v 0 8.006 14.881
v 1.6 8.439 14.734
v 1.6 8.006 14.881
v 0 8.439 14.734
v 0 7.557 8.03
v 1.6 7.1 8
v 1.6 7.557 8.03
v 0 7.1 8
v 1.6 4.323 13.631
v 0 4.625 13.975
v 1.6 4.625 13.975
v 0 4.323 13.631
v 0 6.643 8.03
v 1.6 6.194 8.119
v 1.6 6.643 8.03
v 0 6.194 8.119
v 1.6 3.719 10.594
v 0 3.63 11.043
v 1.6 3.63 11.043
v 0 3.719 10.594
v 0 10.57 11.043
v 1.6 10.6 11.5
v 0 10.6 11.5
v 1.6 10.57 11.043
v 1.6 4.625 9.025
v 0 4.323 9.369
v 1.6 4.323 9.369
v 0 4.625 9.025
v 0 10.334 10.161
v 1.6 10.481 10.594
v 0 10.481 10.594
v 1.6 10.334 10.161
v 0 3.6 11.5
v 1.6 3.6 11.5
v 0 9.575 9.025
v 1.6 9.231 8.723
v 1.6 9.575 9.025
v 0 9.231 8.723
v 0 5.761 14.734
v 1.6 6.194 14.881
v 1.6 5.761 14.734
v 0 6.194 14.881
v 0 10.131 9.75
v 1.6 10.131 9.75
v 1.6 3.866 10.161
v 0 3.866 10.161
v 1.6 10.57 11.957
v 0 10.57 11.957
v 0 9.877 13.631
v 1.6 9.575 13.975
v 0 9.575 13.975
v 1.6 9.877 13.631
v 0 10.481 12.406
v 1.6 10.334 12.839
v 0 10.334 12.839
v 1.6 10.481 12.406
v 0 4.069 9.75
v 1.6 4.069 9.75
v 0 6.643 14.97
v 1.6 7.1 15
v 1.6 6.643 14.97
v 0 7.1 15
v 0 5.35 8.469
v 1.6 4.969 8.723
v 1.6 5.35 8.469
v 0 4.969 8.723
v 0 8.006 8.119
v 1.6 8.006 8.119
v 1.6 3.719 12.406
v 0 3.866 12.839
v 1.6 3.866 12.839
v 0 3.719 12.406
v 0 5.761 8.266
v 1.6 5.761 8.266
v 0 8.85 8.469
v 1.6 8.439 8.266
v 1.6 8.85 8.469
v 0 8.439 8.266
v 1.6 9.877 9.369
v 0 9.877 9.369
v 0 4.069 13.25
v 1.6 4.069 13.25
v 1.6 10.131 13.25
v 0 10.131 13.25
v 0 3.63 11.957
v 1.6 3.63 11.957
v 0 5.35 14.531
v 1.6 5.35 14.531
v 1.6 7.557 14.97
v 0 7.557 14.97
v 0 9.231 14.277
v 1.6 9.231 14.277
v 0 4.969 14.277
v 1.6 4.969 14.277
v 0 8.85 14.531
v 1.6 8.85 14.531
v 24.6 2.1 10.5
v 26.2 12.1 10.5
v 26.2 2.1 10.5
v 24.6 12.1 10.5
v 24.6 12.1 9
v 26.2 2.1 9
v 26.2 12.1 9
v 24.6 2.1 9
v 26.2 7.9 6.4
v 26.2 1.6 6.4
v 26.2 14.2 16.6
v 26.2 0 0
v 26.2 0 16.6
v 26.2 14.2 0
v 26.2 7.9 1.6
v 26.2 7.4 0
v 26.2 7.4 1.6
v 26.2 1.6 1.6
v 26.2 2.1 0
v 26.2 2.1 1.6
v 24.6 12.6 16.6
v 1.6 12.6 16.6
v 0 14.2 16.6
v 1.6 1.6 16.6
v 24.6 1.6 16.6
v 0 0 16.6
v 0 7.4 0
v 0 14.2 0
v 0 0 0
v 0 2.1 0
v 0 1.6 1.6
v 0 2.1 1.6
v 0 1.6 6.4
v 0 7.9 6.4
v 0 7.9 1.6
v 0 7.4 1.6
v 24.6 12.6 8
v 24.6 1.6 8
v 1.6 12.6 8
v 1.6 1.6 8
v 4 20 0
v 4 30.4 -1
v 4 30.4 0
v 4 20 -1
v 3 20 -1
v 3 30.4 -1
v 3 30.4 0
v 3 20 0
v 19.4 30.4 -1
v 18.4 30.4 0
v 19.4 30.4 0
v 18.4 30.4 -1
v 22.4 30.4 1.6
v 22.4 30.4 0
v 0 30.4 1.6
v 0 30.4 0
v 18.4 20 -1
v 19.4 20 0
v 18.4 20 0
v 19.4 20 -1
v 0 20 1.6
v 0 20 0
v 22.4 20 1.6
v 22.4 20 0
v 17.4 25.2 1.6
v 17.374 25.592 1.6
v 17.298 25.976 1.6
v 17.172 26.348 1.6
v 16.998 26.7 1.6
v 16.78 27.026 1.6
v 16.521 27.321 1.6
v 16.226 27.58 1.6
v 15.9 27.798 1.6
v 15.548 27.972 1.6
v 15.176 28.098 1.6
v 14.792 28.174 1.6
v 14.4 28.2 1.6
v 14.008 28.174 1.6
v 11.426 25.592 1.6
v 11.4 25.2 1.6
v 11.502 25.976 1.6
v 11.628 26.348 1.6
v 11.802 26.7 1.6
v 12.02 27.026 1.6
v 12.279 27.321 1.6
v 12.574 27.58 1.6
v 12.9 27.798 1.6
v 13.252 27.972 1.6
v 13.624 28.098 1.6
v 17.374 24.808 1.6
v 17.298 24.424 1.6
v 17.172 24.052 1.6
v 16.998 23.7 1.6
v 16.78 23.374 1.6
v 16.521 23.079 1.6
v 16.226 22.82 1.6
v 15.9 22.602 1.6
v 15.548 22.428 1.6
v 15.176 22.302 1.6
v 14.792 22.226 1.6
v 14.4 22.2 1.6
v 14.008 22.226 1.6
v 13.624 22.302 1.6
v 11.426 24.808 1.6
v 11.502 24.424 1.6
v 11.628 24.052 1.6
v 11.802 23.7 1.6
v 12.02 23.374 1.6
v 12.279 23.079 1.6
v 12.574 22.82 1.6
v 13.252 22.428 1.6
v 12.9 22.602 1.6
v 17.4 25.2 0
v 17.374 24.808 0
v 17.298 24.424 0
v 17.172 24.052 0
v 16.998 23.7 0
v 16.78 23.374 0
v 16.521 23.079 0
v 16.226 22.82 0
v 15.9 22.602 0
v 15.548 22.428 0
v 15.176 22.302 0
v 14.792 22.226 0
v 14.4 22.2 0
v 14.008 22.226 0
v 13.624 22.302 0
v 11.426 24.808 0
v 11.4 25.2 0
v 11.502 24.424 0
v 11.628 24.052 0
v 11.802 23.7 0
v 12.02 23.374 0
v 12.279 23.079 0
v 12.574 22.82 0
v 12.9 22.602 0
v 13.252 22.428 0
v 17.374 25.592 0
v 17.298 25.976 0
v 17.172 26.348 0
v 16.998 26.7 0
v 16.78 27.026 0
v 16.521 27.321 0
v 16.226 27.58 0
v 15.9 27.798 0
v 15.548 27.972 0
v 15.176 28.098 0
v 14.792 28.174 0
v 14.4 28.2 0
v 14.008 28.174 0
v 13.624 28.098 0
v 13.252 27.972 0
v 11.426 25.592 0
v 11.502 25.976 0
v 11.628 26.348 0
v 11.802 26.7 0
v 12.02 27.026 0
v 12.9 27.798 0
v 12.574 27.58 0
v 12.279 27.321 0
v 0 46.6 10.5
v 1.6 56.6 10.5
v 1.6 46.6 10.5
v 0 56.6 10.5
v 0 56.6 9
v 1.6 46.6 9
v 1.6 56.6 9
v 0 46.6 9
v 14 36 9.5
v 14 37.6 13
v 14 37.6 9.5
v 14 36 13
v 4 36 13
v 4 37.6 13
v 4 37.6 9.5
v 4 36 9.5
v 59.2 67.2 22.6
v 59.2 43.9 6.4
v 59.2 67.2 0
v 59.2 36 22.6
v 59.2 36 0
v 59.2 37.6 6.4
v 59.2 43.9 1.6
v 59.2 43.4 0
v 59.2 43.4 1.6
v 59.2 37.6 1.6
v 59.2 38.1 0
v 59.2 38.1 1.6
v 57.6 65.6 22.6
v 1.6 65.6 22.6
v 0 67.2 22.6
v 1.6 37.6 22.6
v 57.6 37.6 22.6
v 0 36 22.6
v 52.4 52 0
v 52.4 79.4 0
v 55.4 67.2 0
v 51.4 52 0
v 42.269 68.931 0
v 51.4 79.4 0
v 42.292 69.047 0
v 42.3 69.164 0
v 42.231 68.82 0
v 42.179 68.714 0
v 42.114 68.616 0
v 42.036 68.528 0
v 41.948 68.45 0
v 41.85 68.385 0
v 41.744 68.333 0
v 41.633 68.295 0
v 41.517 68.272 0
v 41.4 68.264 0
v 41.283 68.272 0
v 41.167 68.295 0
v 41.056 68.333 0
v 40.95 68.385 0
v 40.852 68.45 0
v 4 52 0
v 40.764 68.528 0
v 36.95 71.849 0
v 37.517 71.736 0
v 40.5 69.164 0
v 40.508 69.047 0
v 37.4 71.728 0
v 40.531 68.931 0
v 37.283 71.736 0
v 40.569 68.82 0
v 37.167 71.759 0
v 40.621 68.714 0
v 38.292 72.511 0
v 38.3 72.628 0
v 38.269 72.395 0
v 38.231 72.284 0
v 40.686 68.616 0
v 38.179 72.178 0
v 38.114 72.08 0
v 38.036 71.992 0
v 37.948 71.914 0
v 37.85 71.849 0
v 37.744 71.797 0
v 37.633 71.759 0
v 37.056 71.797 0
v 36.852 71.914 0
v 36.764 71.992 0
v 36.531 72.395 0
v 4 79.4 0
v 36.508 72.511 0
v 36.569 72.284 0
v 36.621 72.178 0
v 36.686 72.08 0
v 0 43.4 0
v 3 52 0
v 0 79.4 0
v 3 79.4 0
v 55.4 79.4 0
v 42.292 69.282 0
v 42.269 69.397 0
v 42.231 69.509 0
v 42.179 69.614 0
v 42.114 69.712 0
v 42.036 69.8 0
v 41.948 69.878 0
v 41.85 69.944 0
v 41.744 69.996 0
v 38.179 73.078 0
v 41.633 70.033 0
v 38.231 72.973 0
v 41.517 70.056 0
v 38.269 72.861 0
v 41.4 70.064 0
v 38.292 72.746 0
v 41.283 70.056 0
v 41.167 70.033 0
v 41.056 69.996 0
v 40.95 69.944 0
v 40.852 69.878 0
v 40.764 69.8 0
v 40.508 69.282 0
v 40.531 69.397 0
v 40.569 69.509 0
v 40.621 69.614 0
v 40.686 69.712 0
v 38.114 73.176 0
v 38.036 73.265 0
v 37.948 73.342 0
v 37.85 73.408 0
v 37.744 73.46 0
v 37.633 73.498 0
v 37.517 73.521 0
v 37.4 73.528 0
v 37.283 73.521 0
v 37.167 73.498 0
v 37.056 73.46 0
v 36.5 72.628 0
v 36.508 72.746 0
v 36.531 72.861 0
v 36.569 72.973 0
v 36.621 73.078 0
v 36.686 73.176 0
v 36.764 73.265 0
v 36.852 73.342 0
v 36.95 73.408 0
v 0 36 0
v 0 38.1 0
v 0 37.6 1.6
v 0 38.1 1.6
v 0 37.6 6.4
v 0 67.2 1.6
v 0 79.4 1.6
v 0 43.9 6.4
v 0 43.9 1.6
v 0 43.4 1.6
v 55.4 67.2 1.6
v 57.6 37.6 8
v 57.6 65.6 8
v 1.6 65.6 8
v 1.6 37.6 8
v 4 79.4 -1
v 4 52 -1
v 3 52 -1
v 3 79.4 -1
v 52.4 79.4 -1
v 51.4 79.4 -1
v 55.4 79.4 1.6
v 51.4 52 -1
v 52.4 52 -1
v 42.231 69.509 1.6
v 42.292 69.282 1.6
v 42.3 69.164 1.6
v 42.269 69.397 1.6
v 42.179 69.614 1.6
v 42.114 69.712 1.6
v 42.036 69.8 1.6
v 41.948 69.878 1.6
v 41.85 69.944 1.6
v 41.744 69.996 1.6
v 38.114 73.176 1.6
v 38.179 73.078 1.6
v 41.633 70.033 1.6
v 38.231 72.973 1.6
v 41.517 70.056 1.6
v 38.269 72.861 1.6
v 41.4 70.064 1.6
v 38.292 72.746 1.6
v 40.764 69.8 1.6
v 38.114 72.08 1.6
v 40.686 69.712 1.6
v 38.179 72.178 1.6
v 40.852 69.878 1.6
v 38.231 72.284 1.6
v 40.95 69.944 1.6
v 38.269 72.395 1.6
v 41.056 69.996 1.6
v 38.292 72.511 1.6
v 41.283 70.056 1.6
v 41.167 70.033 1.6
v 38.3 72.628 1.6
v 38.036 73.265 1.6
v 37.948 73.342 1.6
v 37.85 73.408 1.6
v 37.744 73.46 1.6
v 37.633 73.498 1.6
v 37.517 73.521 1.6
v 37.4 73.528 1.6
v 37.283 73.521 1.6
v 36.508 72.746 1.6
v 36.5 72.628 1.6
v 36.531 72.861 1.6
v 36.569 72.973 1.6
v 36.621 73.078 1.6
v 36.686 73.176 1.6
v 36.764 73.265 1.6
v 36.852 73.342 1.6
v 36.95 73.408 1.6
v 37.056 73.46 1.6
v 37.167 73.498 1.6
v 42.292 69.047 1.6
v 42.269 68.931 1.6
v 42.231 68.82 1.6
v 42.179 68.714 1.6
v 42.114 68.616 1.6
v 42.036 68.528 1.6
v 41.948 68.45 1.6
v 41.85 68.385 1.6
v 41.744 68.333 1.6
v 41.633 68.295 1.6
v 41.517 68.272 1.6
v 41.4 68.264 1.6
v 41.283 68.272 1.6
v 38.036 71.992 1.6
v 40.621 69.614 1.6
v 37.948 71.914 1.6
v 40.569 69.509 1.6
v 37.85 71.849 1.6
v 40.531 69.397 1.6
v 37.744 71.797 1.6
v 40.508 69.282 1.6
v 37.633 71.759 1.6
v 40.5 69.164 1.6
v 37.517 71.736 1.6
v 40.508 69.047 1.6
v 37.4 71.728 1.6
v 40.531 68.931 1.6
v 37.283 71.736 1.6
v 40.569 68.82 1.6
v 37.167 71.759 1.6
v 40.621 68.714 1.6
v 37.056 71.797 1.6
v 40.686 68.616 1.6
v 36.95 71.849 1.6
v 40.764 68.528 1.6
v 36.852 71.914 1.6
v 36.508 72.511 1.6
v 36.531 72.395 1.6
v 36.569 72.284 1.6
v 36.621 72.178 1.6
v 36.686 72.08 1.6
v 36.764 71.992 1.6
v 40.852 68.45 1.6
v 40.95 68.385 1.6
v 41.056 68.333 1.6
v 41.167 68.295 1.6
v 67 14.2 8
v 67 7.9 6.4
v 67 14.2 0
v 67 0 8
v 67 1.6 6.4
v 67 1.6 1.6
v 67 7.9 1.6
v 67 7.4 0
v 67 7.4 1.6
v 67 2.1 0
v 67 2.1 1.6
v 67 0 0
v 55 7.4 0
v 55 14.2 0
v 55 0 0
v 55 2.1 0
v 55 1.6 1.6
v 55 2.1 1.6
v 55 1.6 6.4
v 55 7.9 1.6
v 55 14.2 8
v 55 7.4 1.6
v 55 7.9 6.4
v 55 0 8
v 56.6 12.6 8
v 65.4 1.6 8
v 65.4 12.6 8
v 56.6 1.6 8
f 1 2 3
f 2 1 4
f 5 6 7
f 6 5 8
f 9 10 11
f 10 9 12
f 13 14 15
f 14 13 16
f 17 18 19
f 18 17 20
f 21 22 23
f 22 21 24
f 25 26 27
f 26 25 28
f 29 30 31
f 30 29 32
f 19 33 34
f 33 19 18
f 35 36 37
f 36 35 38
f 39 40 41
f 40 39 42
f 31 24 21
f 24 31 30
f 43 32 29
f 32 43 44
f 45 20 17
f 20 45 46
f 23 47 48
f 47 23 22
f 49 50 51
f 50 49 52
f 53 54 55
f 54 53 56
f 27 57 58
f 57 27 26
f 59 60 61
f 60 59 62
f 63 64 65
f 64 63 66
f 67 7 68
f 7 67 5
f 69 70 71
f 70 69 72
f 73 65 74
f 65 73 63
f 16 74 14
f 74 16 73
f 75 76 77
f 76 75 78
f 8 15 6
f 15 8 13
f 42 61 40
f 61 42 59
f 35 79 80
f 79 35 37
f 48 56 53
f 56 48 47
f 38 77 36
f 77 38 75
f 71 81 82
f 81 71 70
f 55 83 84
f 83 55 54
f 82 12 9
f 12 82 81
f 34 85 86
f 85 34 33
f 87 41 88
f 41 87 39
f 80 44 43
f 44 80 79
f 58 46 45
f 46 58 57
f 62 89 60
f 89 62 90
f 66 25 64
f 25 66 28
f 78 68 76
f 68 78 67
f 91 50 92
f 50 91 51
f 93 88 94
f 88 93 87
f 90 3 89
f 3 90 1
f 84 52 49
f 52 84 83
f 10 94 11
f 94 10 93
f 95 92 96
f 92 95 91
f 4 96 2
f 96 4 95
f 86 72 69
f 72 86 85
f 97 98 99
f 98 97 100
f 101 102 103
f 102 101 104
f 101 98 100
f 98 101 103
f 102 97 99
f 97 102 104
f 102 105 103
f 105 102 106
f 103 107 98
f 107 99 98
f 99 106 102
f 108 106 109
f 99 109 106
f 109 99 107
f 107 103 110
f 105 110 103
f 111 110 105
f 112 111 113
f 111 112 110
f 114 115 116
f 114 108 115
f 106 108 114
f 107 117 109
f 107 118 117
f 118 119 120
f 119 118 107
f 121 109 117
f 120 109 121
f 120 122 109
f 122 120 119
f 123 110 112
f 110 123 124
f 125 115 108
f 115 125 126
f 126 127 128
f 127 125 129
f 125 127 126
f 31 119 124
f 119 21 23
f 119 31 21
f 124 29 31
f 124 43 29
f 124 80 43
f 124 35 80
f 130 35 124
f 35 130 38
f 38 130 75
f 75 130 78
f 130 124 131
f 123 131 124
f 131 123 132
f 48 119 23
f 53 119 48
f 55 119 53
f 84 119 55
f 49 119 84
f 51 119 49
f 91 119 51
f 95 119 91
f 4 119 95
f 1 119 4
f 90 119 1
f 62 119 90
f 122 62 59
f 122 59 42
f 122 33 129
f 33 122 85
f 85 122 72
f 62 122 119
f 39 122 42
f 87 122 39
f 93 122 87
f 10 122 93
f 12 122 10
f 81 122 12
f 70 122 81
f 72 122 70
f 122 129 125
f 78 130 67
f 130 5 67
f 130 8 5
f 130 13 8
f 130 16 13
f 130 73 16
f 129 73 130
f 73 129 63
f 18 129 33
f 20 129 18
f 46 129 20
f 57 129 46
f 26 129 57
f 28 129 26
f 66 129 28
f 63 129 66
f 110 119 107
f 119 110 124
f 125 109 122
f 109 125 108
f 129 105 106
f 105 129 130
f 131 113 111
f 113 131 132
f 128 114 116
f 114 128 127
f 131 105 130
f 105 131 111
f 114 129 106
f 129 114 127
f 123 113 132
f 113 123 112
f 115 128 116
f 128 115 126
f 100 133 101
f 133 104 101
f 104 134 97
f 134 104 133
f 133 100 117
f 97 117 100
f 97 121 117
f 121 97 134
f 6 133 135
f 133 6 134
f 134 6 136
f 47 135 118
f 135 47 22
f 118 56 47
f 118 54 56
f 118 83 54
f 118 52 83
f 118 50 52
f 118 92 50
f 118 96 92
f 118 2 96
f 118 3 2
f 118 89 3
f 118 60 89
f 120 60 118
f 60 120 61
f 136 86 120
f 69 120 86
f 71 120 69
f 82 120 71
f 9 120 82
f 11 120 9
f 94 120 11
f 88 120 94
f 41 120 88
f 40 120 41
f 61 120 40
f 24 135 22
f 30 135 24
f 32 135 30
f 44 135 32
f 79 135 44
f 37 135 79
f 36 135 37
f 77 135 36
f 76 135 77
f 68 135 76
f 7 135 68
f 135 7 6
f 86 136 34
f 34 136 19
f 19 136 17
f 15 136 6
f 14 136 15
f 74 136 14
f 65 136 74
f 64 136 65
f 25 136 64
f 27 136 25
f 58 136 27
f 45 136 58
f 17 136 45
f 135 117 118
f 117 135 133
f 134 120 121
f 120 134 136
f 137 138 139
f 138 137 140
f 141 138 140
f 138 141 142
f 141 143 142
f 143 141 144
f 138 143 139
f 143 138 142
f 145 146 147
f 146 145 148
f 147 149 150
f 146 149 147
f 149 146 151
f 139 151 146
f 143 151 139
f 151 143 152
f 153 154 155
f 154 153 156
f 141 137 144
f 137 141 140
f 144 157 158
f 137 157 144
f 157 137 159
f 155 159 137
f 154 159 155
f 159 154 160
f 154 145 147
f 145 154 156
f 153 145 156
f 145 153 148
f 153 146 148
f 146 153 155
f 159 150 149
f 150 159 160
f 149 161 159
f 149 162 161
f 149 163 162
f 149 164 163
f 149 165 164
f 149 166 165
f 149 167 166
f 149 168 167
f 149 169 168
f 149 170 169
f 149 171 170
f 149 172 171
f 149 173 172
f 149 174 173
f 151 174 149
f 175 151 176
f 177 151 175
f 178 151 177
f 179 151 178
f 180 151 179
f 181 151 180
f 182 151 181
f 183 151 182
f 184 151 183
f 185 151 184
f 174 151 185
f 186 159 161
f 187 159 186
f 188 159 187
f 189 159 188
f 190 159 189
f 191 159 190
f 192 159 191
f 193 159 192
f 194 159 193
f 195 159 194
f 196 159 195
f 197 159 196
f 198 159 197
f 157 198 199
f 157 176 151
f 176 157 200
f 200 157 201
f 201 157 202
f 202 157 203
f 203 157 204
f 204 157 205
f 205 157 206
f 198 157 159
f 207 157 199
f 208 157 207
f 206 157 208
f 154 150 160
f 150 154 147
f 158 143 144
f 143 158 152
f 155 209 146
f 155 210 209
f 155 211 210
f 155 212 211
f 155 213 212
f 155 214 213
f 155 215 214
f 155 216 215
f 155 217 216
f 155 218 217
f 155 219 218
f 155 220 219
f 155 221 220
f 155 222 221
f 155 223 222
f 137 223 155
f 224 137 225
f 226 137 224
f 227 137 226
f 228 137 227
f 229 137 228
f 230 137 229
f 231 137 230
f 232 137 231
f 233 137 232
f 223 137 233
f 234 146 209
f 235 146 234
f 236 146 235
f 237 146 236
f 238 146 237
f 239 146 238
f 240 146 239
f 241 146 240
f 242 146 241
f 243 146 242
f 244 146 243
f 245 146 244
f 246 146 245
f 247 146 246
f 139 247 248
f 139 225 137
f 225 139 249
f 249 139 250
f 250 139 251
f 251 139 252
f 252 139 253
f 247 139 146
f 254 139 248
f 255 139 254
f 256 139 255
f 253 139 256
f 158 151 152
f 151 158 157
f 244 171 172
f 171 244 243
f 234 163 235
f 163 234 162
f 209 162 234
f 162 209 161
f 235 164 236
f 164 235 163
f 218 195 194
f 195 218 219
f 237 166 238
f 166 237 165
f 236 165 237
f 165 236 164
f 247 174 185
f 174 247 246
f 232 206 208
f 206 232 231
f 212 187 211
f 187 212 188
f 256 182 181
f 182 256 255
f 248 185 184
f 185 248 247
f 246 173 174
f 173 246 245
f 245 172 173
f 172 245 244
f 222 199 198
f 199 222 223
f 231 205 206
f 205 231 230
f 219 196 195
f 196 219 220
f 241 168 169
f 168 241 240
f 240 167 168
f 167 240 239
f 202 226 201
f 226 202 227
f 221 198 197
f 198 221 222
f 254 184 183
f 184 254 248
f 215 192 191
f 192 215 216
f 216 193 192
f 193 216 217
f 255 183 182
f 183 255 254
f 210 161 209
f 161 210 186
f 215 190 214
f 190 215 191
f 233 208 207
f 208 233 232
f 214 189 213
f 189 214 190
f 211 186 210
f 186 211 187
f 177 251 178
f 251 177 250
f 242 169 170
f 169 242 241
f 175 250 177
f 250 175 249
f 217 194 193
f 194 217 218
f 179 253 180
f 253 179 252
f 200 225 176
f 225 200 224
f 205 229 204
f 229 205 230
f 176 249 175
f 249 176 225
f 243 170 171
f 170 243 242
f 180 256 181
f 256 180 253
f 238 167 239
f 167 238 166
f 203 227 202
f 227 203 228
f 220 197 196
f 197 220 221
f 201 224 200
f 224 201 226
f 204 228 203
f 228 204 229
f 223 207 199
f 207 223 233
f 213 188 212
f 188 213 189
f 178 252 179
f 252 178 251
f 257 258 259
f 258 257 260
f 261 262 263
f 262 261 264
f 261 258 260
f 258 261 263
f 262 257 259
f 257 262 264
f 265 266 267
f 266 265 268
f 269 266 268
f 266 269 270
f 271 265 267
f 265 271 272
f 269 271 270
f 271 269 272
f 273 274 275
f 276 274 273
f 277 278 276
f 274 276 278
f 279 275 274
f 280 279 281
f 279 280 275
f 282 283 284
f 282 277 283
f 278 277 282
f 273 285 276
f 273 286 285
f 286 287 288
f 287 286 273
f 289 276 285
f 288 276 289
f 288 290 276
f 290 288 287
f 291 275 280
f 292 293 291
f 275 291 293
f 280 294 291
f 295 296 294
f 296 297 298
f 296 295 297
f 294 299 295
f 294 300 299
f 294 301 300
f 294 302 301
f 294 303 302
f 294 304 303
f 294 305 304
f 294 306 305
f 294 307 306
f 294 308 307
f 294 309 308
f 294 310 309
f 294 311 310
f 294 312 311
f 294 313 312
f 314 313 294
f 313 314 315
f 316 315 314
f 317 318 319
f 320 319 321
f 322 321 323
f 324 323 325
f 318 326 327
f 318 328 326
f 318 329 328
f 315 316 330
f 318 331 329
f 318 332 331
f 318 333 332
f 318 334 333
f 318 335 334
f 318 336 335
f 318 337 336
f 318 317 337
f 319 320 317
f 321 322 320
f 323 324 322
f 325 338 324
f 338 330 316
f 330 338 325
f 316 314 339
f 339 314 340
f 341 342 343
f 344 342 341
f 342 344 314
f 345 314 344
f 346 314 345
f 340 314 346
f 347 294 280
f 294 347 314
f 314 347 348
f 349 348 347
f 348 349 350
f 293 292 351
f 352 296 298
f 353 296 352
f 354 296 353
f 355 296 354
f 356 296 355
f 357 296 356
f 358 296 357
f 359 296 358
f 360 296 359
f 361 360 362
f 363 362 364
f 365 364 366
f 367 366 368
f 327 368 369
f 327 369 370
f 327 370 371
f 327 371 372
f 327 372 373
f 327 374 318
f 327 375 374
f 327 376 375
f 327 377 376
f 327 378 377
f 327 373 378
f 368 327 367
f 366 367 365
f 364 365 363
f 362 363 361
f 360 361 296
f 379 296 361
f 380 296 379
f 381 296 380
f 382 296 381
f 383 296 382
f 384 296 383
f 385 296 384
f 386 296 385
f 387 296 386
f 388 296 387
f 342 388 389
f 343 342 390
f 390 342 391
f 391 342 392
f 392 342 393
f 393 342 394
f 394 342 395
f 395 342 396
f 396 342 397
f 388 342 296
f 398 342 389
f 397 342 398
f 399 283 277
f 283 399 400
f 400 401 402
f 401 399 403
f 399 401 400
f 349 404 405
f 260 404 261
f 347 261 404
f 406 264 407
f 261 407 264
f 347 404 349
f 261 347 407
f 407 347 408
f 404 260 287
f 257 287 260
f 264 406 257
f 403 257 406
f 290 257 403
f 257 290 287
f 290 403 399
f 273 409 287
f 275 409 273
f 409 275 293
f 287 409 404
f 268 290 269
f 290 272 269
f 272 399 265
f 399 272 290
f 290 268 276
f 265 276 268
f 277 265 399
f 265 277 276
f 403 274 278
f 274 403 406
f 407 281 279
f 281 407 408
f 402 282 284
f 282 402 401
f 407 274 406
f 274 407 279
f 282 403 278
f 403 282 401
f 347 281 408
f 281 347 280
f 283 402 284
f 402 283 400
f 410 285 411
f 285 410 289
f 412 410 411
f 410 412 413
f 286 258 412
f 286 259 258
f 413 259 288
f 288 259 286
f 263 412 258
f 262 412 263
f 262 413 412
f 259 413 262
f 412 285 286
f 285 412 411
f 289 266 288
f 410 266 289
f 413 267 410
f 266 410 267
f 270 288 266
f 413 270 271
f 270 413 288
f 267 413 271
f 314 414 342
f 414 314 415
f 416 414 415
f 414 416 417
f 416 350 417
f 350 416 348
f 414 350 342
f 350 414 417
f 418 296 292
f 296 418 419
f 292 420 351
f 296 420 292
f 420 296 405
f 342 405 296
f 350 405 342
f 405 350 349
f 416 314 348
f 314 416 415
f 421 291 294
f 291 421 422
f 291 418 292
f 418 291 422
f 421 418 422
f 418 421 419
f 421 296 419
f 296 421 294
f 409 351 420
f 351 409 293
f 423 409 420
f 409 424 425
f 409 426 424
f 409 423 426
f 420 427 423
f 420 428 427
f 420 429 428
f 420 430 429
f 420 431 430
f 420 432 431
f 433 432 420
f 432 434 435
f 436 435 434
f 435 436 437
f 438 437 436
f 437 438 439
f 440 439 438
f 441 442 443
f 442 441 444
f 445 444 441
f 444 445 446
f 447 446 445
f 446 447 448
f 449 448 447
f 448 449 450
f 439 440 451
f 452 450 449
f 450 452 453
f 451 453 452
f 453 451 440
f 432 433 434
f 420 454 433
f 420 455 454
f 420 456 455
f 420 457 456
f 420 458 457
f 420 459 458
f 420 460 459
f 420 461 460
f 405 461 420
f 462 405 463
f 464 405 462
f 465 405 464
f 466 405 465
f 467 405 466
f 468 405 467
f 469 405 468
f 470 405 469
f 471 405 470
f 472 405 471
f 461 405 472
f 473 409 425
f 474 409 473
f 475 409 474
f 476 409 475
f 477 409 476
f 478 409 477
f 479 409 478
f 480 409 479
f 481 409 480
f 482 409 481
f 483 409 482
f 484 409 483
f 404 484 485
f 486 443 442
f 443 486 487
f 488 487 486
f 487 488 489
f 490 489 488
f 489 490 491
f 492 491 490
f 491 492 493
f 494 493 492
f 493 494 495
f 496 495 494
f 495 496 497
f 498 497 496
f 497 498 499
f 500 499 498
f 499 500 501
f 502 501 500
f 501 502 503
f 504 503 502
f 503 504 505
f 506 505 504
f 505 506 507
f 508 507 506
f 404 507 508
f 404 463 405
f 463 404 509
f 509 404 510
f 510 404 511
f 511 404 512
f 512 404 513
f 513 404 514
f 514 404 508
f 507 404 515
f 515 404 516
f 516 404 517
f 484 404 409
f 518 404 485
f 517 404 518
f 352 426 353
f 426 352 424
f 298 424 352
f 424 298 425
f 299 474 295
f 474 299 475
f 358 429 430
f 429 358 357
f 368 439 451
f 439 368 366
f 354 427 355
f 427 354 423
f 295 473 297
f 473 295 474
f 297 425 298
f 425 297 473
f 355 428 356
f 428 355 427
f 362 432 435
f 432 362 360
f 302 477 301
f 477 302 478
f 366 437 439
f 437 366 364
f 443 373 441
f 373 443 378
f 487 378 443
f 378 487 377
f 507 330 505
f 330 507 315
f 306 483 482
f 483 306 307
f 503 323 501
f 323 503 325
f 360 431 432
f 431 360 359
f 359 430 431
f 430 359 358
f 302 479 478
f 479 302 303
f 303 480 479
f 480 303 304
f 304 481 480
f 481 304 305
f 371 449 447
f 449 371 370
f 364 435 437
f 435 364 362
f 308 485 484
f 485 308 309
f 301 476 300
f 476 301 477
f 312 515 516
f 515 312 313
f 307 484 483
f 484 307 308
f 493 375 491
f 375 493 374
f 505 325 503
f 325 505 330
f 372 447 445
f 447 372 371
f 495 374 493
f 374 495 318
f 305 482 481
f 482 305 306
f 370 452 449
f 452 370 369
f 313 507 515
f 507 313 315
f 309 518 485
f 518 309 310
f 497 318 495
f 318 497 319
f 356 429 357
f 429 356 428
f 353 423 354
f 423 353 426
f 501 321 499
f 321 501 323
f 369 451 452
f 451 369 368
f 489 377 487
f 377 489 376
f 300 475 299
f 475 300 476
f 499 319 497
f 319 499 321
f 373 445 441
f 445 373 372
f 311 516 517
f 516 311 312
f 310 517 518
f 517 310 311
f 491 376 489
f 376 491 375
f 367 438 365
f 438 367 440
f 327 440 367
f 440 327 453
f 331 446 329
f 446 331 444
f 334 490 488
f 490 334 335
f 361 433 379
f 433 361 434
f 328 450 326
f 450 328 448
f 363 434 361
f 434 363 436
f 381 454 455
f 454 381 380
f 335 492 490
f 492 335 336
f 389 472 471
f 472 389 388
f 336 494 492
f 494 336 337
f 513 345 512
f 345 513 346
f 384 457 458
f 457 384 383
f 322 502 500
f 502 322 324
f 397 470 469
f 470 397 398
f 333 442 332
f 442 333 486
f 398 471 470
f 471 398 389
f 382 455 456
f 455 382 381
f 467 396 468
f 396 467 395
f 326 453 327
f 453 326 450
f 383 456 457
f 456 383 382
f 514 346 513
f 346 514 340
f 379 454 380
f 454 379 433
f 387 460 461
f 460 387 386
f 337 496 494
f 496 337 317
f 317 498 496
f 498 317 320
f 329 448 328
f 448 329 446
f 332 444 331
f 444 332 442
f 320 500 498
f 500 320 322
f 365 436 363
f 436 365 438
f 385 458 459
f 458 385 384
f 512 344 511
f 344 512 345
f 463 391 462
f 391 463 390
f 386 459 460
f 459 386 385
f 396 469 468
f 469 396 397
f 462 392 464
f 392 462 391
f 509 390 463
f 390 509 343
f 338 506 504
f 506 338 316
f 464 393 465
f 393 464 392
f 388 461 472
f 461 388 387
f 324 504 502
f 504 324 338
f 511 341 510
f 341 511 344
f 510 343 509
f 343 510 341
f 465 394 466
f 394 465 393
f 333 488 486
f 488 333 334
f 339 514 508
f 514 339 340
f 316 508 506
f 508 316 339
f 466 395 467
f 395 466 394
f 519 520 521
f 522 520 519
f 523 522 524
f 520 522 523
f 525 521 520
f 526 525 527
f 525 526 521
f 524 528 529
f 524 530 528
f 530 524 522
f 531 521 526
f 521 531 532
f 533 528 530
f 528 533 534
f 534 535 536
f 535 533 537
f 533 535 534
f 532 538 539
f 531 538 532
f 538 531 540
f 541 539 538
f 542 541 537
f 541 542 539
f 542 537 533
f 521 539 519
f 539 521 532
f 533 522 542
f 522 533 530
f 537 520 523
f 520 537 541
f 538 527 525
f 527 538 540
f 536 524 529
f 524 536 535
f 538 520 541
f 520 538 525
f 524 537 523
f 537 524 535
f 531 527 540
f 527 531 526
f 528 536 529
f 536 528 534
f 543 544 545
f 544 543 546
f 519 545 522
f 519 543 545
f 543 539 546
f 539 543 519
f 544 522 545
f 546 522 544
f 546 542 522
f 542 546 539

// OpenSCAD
// Vocalens temple-clip pods — first mechanical prototype
//
// Design approach: rather than fabricate a full glasses frame (hinges, nose
// bridge, lens-fit) from scratch, these pods clip onto the temple arm of an
// existing pair of glasses. Two small pods instead of one big one, split by
// where the weight naturally belongs:
//   - FRONT POD: near the hinge. Houses ONLY the camera module, detached
//     from the XIAO and connected back by its FPC ribbon, plus the touch
//     pad. The camera has to be at the front (it must aim forward) but
//     nothing else does — so nothing else goes here. This is what keeps
//     the visible, forward part of the device small.
//   - REAR POD: behind the ear. Houses the XIAO board, battery and buzzer
//     (placeholder for the eventual bone-conduction transducer). Behind-
//     the-ear is where hearing aids and BTE headphones put their bulk for
//     exactly this reason — it's already physically "spoken for" on a
//     normal face, and hair covers it.
//   - The camera ribbon runs along the temple arm between the two. Route
//     it under the arm or tuck it along the top edge; a dab of removable
//     adhesive at one or two points is enough for a prototype.
//
// The temple channel is cut THROUGH the pod body rather than bolted
// underneath it, so the channel ceiling and the cavity floor share one
// wall. That's worth ~5mm of height versus stacking a separate clip.
//
// Printer: Snapmaker U1, 270x270x270mm, standard FDM. WALL and CLEARANCE
// assume a 0.4mm nozzle — adjust those two first if your profile differs.
//
// !! MEASURE BEFORE PRINTING !!
// TEMPLE_* must match the actual glasses you're clipping onto, and the
// CAM_*/XIAO_* values must match your actual parts. Everything else
// follows from those. Print ONE fit-test piece (part="fit_test") before
// committing to a full pod — it's a 3-minute print that will save you a
// wasted hour.
//
// PLACEHOLDER SIZES: no touch sensor, amp, or battery sourced yet (team
// has the Freenove Ultimate Starter Kit + XIAO Sense only). Battery and
// buzzer cavities are sized for common off-the-shelf parts so this prints
// and test-fits NOW; tighten them once real parts arrive.
//
// Render each printable part:
//   openscad -o front_base.stl -D 'part="front_base"' vocalens_pod.scad
//   openscad -o front_lid.stl  -D 'part="front_lid"'  vocalens_pod.scad
//   openscad -o rear_base.stl  -D 'part="rear_base"'  vocalens_pod.scad
//   openscad -o rear_lid.stl   -D 'part="rear_lid"'   vocalens_pod.scad
//   openscad -o fit_test.stl   -D 'part="fit_test"'   vocalens_pod.scad

/* [Print settings] */
WALL = 1.6;        // 4 perimeters at 0.4mm nozzle — don't go below 1.2
CLEARANCE = 0.3;   // fit tolerance between mating FDM parts
EPS = 0.01;        // overlap to avoid coplanar faces in unions
$fn = 48;

/* [Temple arm — MEASURE YOUR ACTUAL GLASSES] */
TEMPLE_THICKNESS = 4.5;  // temple arm thickness (side to side), mm
TEMPLE_WIDTH = 6.0;      // temple arm width (top to bottom), mm
SNAP_GAP = 1.0;          // how much narrower the opening is than the arm

/* [Camera module — detached from the XIAO, on its FPC ribbon] */
// The OV2640 module on the Sense expansion unclips from its FPC connector
// and can sit on its own. MEASURE YOURS — these are generous placeholders.
CAM_LEN = 11;   // along the temple
CAM_WID = 11;   // across (this is what sets front-pod width)
CAM_HGT = 7;    // protrusion from the temple

/* [XIAO ESP32S3 Sense board] */
// Bare XIAO is ~21 x 17.5mm. XIAO_HGT is the board + Sense expansion stack
// WITHOUT the camera module. In SINGLE_POD mode the camera stays attached,
// so its height is added automatically below.
XIAO_LEN = 23;
XIAO_WID = 19;
XIAO_HGT = 8;

/* [Battery placeholder — common 3.7V 1S LiPo, e.g. 602030] */
BATT_LEN = 30;
BATT_WID = 20;
BATT_HGT = 6;

/* [Build variant] */
// COMMITTED BUILD for this event: ONE pod holding everything, using only
// parts in the Freenove kit + XIAO Sense. No purchases, no shipping risk.
// The two-pod split and bone conduction are documented as future
// upgrades (see hardware/README.md) but are NOT part of this build.
SINGLE_POD = true;

/* [Audio output — pick one] */
// Kept false for this build: the kit speaker is what's actually on hand.
// BONE_CONDUCTION=true still renders correctly (see cad/bone_conduction/)
// as a documented future-upgrade reference for the pitch deck, but it is
// not part of the committed build since it requires an external part.
BONE_CONDUCTION = false;

/* [Speaker — the round speaker included in the Freenove kit] */
// MEASURE YOURS. Kit speakers are typically 20-28mm diameter, 5-8mm deep.
SPKR_DIA = 28;
SPKR_HGT = 6;

/* [Bone-conduction transducer — e.g. Adafruit ADA1674] */
// Mounts OUTSIDE the cavity, on the inner face, so these dimensions set
// the mounting pad, not internal volume.
BC_LEN = 21.5;
BC_WID = 14.5;
BC_HGT = 8;

/* [Audio amp — the kit's "Audio Converter & Amplifier" module] */
// MEASURE YOURS. Small I2S breakout, typically ~22 x 16 x 4mm.
AMP_LEN = 22;
AMP_WID = 16;
AMP_HGT = 5;

part = "layout"; // front_base | front_lid | rear_base | rear_lid | fit_test | layout

// Derived: the temple channel sits at the bottom of the pod body
CH_H = TEMPLE_THICKNESS + CLEARANCE;   // channel height
CH_W = TEMPLE_WIDTH + CLEARANCE;       // channel width
// Pod width is driven by whatever it has to hold, never by the channel
// alone — a pod narrower than its own contents silently won't fit them.
function body_w(content_w) = max(CH_W, content_w) + 2 * WALL;

// ---------------------------------------------------------------------
// Pod body: one solid block with the temple channel subtracted from the
// bottom and a component cavity opened in the top.
//   length     — along the temple arm
//   cav_h      — component cavity height
//   extras()   — additional subtractions (ports, holes), applied in the
//                body's own coordinate space
// ---------------------------------------------------------------------
module pod_body(length, cav_h, content_w) {
  BODY_W = body_w(content_w);
  total_h = WALL + CH_H + WALL + cav_h + WALL;
  difference() {
    cube([length, BODY_W, total_h]);

    // temple channel, running the full length, open at the bottom face
    translate([-EPS, WALL, WALL])
      cube([length + 2 * EPS, CH_W, CH_H]);

    // slot from channel down through the bottom face, narrower than the
    // arm so the pod snaps on and grips by spring tension
    translate([-EPS, WALL + SNAP_GAP / 2, -EPS])
      cube([length + 2 * EPS, CH_W - SNAP_GAP, WALL + 2 * EPS]);

    // component cavity, open at the top face
    translate([WALL, WALL, WALL + CH_H + WALL])
      cube([length - 2 * WALL, BODY_W - 2 * WALL, cav_h + WALL + EPS]);

    children();
  }
}

// cavity floor height, for positioning ports relative to the cavity
function cav_floor() = WALL + CH_H + WALL;

// ---------------------------------------------------------------------
// Press-fit lid: drops into the cavity mouth, held by friction ribs.
// ---------------------------------------------------------------------
// Ports that face upward (touch pad, sound holes) go in the LID, not the
// base: the base's cavity is open at the top, so cutting them there would
// just remove air.
module pod_lid(length, content_w, has_touch_pad = false, touch_from_end = 8,
               sound_holes = false, sound_from_end = 4, sound_count = 4) {
  lid_l = length - 2 * WALL - 2 * CLEARANCE;
  lid_w = body_w(content_w) - 2 * WALL - 2 * CLEARANCE;
  difference() {
    union() {
      cube([lid_l, lid_w, WALL]);
      // friction ribs on the underside
      for (rx = [3, lid_l - 4])
        translate([rx, 0, -1.0])
          cube([1, lid_w, 1.0 + EPS]);
    }
    if (has_touch_pad)
      translate([lid_l - touch_from_end, lid_w / 2, -1])
        cylinder(h = WALL + 2, d = 6);
    // speaker grille — a ring of holes over the speaker position
    if (sound_holes)
      for (ring = [0 : 2])
        for (a = [0 : 60 : 359])
          translate([lid_l - sound_from_end - ring * 4 - 4,
                     lid_w / 2 + (ring == 0 ? 0 : ring * 4 * sin(a)), -1])
            cylinder(h = WALL + 2, d = 1.8);
  }
}

// ---------------------------------------------------------------------
// SINGLE POD — everything in one box, camera still attached to the board.
// Mount it at the FRONT of the temple so the camera aims forward.
// ---------------------------------------------------------------------
SP_STACK_H = XIAO_HGT + CAM_HGT + AMP_HGT;   // board + camera + amp stacked
SP_LEN = max(XIAO_LEN, AMP_LEN) + (BONE_CONDUCTION ? 0 : SPKR_DIA) + 2 * WALL + 5;
SP_W   = BONE_CONDUCTION ? max(XIAO_WID, AMP_WID) : max(XIAO_WID, AMP_WID, SPKR_DIA);

module single_base() {
  pw = body_w(SP_W);
  pod_body(SP_LEN, SP_STACK_H, SP_W) {
    // camera lens opening — front face
    translate([-1, pw / 2, cav_floor() + SP_STACK_H / 2])
      rotate([0, 90, 0])
        cylinder(h = WALL + 2, d = 8);

    // USB-C access — side face
    translate([SP_LEN - 15, -1, cav_floor() + 2])
      cube([11, WALL + 2, 4]);

    // bone-conduction pad on the inner face, when fitted
    if (BONE_CONDUCTION) {
      translate([(SP_LEN - BC_LEN) / 2, -EPS, cav_floor() - 1])
        cube([BC_LEN, 1.0, BC_WID]);
      translate([SP_LEN / 2, WALL / 2, cav_floor() + 2])
        rotate([90, 0, 0]) cylinder(h = WALL + 2, d = 3, center = true);
    }
  }
}

module single_lid() {
  pod_lid(SP_LEN, SP_W, has_touch_pad = true, touch_from_end = 7,
          sound_holes = !BONE_CONDUCTION, sound_from_end = 6);
}

// ---------------------------------------------------------------------
// FRONT POD — camera module + touch pad ONLY. Kept deliberately minimal:
// this is the part people see.
// ---------------------------------------------------------------------
FRONT_LEN = CAM_LEN + 2 * WALL + 12;  // camera + room for the touch pad
FRONT_W = CAM_WID;

module front_base() {
  fw = body_w(FRONT_W);
  pod_body(FRONT_LEN, CAM_HGT, FRONT_W) {
    // camera lens opening — front face, centred on the cavity
    translate([-1, fw / 2, cav_floor() + CAM_HGT / 2])
      rotate([0, 90, 0])
        cylinder(h = WALL + 2, d = 7);

    // FPC ribbon exit — rear face, a flat slot back toward the rear pod
    translate([FRONT_LEN - WALL - EPS, fw / 2 - 5, cav_floor() + 1])
      cube([WALL + 2, 10, 1.5]);
  }
}

module front_lid() { pod_lid(FRONT_LEN, FRONT_W, has_touch_pad = true); }

// ---------------------------------------------------------------------
// REAR POD — XIAO board + battery + buzzer. Sits behind the ear where
// bulk is acceptable and largely hidden.
// ---------------------------------------------------------------------
// Board and amp STACK (amp sits on the board), so the pod length is set by
// the longer of that stack and the speaker sitting next to it — not by
// adding every component end to end.
// With bone conduction the transducer lives on the outer face, so nothing
// but the board+amp stack has to fit inside — roughly half the length.
REAR_LEN = BONE_CONDUCTION
  ? max(XIAO_LEN, AMP_LEN) + 2 * WALL + 5
  : max(XIAO_LEN, AMP_LEN) + SPKR_DIA + 2 * WALL + 5;
REAR_W = BONE_CONDUCTION
  ? max(XIAO_WID, AMP_WID)
  : max(XIAO_WID, AMP_WID, SPKR_DIA);
REAR_CAV_H = BONE_CONDUCTION
  ? XIAO_HGT + AMP_HGT
  : max(XIAO_HGT + AMP_HGT, SPKR_HGT);

module rear_base() {
  rw = body_w(REAR_W);
  pod_body(REAR_LEN, REAR_CAV_H, REAR_W) {
    // Bone-conduction transducer pad: a shallow recess on the INNER face
    // (the side against the head) to seat the transducer, plus a wire
    // pass-through into the cavity. Firm bone contact is what makes bone
    // conduction work, so it must sit proud against the skull, not buried.
    if (BONE_CONDUCTION) {
      translate([(REAR_LEN - BC_LEN) / 2, -EPS, cav_floor() - 1])
        cube([BC_LEN, 1.0, BC_WID]);
      translate([REAR_LEN / 2, WALL / 2, cav_floor() + 2])
        rotate([90, 0, 0])
          cylinder(h = WALL + 2, d = 3, center = true);
    }
    // FPC ribbon entry from the front pod — front face
    translate([-1, rw / 2 - 5, cav_floor() + 1])
      cube([WALL + 2, 10, 1.5]);

    // USB-C access slot — side face, over the board end, so you can
    // charge and reflash without pulling the lid off
    translate([4, -1, cav_floor() + 1.5])
      cube([10, WALL + 2, 3.5]);
  }
}

// Buzzer sits at the rear end of the pod, so the sound holes go there too.
// No grille needed when the transducer is on the outer face.
module rear_lid() {
  pod_lid(REAR_LEN, REAR_W, sound_holes = !BONE_CONDUCTION, sound_from_end = 6);
}

// ---------------------------------------------------------------------
// FIT TEST — a 12mm slice of the clip only. Print this FIRST and check it
// snaps onto your glasses before printing a full pod. If it's loose,
// increase SNAP_GAP; if it won't go on or splays the arm, decrease it.
// ---------------------------------------------------------------------
module fit_test() {
  intersection() {
    pod_body(12, 3, FRONT_W);
    cube([12, body_w(FRONT_W), WALL + CH_H + WALL]);
  }
}

// ---------------------------------------------------------------------
if (part == "front_base") front_base();
else if (part == "front_lid") front_lid();
else if (part == "rear_base") rear_base();
else if (part == "rear_lid") rear_lid();
else if (part == "fit_test") fit_test();
else if (part == "single_base") single_base();
else if (part == "single_lid") single_lid();
else if (part == "single_plate") {
  // The one-pod build: three parts, everything you need for Friday.
  pw = body_w(SP_W);
  lw = pw - 2 * WALL - 2 * CLEARANCE;
  translate([0, 0, 0]) single_base();
  translate([0, pw + 8 + lw, WALL]) rotate([180, 0, 0]) single_lid();
  translate([SP_LEN + 8, 0, 0]) fit_test();
}
else if (part == "plate") {
  // Everything on one bed, spaced 8mm apart. This is the single file to
  // slice if you just want to print the whole thing in one go.
  //
  // The lids are FLIPPED rib-side-up here. Their friction ribs protrude
  // below the plate, so printed as-modelled the plate would float 1mm off
  // the bed and the slicer would add supports under it. Flipped, the flat
  // face is on the bed and the ribs print as small upward bumps — no
  // supports, better surface finish on the visible side.
  fw = body_w(FRONT_W);
  rw = body_w(REAR_W);
  // A flipped lid extends BACKWARDS in Y from its origin, so each lid's
  // own width has to be added to the offset or it overlaps the base in
  // front of it. Getting this wrong fuses two parts into one on the plate.
  flw = fw - 2 * WALL - 2 * CLEARANCE;   // front lid width
  rlw = rw - 2 * WALL - 2 * CLEARANCE;   // rear lid width
  gap = 8;

  translate([0, 0, 0])             front_base();
  translate([FRONT_LEN + gap, 0, 0]) rear_base();
  translate([0, fw + gap + flw, WALL])
    rotate([180, 0, 0]) front_lid();
  translate([FRONT_LEN + gap, rw + gap + rlw, WALL])
    rotate([180, 0, 0]) rear_lid();
  translate([0, max(fw + gap + flw, rw + gap + rlw) + gap + 6, 0])
    fit_test();
}
else {
  translate([0, 0, 0])   front_base();
  translate([0, 20, 0])  front_lid();
  translate([0, 36, 0])  rear_base();
  translate([0, 52, 0])  rear_lid();
  translate([55, 0, 0])  fit_test();
}
